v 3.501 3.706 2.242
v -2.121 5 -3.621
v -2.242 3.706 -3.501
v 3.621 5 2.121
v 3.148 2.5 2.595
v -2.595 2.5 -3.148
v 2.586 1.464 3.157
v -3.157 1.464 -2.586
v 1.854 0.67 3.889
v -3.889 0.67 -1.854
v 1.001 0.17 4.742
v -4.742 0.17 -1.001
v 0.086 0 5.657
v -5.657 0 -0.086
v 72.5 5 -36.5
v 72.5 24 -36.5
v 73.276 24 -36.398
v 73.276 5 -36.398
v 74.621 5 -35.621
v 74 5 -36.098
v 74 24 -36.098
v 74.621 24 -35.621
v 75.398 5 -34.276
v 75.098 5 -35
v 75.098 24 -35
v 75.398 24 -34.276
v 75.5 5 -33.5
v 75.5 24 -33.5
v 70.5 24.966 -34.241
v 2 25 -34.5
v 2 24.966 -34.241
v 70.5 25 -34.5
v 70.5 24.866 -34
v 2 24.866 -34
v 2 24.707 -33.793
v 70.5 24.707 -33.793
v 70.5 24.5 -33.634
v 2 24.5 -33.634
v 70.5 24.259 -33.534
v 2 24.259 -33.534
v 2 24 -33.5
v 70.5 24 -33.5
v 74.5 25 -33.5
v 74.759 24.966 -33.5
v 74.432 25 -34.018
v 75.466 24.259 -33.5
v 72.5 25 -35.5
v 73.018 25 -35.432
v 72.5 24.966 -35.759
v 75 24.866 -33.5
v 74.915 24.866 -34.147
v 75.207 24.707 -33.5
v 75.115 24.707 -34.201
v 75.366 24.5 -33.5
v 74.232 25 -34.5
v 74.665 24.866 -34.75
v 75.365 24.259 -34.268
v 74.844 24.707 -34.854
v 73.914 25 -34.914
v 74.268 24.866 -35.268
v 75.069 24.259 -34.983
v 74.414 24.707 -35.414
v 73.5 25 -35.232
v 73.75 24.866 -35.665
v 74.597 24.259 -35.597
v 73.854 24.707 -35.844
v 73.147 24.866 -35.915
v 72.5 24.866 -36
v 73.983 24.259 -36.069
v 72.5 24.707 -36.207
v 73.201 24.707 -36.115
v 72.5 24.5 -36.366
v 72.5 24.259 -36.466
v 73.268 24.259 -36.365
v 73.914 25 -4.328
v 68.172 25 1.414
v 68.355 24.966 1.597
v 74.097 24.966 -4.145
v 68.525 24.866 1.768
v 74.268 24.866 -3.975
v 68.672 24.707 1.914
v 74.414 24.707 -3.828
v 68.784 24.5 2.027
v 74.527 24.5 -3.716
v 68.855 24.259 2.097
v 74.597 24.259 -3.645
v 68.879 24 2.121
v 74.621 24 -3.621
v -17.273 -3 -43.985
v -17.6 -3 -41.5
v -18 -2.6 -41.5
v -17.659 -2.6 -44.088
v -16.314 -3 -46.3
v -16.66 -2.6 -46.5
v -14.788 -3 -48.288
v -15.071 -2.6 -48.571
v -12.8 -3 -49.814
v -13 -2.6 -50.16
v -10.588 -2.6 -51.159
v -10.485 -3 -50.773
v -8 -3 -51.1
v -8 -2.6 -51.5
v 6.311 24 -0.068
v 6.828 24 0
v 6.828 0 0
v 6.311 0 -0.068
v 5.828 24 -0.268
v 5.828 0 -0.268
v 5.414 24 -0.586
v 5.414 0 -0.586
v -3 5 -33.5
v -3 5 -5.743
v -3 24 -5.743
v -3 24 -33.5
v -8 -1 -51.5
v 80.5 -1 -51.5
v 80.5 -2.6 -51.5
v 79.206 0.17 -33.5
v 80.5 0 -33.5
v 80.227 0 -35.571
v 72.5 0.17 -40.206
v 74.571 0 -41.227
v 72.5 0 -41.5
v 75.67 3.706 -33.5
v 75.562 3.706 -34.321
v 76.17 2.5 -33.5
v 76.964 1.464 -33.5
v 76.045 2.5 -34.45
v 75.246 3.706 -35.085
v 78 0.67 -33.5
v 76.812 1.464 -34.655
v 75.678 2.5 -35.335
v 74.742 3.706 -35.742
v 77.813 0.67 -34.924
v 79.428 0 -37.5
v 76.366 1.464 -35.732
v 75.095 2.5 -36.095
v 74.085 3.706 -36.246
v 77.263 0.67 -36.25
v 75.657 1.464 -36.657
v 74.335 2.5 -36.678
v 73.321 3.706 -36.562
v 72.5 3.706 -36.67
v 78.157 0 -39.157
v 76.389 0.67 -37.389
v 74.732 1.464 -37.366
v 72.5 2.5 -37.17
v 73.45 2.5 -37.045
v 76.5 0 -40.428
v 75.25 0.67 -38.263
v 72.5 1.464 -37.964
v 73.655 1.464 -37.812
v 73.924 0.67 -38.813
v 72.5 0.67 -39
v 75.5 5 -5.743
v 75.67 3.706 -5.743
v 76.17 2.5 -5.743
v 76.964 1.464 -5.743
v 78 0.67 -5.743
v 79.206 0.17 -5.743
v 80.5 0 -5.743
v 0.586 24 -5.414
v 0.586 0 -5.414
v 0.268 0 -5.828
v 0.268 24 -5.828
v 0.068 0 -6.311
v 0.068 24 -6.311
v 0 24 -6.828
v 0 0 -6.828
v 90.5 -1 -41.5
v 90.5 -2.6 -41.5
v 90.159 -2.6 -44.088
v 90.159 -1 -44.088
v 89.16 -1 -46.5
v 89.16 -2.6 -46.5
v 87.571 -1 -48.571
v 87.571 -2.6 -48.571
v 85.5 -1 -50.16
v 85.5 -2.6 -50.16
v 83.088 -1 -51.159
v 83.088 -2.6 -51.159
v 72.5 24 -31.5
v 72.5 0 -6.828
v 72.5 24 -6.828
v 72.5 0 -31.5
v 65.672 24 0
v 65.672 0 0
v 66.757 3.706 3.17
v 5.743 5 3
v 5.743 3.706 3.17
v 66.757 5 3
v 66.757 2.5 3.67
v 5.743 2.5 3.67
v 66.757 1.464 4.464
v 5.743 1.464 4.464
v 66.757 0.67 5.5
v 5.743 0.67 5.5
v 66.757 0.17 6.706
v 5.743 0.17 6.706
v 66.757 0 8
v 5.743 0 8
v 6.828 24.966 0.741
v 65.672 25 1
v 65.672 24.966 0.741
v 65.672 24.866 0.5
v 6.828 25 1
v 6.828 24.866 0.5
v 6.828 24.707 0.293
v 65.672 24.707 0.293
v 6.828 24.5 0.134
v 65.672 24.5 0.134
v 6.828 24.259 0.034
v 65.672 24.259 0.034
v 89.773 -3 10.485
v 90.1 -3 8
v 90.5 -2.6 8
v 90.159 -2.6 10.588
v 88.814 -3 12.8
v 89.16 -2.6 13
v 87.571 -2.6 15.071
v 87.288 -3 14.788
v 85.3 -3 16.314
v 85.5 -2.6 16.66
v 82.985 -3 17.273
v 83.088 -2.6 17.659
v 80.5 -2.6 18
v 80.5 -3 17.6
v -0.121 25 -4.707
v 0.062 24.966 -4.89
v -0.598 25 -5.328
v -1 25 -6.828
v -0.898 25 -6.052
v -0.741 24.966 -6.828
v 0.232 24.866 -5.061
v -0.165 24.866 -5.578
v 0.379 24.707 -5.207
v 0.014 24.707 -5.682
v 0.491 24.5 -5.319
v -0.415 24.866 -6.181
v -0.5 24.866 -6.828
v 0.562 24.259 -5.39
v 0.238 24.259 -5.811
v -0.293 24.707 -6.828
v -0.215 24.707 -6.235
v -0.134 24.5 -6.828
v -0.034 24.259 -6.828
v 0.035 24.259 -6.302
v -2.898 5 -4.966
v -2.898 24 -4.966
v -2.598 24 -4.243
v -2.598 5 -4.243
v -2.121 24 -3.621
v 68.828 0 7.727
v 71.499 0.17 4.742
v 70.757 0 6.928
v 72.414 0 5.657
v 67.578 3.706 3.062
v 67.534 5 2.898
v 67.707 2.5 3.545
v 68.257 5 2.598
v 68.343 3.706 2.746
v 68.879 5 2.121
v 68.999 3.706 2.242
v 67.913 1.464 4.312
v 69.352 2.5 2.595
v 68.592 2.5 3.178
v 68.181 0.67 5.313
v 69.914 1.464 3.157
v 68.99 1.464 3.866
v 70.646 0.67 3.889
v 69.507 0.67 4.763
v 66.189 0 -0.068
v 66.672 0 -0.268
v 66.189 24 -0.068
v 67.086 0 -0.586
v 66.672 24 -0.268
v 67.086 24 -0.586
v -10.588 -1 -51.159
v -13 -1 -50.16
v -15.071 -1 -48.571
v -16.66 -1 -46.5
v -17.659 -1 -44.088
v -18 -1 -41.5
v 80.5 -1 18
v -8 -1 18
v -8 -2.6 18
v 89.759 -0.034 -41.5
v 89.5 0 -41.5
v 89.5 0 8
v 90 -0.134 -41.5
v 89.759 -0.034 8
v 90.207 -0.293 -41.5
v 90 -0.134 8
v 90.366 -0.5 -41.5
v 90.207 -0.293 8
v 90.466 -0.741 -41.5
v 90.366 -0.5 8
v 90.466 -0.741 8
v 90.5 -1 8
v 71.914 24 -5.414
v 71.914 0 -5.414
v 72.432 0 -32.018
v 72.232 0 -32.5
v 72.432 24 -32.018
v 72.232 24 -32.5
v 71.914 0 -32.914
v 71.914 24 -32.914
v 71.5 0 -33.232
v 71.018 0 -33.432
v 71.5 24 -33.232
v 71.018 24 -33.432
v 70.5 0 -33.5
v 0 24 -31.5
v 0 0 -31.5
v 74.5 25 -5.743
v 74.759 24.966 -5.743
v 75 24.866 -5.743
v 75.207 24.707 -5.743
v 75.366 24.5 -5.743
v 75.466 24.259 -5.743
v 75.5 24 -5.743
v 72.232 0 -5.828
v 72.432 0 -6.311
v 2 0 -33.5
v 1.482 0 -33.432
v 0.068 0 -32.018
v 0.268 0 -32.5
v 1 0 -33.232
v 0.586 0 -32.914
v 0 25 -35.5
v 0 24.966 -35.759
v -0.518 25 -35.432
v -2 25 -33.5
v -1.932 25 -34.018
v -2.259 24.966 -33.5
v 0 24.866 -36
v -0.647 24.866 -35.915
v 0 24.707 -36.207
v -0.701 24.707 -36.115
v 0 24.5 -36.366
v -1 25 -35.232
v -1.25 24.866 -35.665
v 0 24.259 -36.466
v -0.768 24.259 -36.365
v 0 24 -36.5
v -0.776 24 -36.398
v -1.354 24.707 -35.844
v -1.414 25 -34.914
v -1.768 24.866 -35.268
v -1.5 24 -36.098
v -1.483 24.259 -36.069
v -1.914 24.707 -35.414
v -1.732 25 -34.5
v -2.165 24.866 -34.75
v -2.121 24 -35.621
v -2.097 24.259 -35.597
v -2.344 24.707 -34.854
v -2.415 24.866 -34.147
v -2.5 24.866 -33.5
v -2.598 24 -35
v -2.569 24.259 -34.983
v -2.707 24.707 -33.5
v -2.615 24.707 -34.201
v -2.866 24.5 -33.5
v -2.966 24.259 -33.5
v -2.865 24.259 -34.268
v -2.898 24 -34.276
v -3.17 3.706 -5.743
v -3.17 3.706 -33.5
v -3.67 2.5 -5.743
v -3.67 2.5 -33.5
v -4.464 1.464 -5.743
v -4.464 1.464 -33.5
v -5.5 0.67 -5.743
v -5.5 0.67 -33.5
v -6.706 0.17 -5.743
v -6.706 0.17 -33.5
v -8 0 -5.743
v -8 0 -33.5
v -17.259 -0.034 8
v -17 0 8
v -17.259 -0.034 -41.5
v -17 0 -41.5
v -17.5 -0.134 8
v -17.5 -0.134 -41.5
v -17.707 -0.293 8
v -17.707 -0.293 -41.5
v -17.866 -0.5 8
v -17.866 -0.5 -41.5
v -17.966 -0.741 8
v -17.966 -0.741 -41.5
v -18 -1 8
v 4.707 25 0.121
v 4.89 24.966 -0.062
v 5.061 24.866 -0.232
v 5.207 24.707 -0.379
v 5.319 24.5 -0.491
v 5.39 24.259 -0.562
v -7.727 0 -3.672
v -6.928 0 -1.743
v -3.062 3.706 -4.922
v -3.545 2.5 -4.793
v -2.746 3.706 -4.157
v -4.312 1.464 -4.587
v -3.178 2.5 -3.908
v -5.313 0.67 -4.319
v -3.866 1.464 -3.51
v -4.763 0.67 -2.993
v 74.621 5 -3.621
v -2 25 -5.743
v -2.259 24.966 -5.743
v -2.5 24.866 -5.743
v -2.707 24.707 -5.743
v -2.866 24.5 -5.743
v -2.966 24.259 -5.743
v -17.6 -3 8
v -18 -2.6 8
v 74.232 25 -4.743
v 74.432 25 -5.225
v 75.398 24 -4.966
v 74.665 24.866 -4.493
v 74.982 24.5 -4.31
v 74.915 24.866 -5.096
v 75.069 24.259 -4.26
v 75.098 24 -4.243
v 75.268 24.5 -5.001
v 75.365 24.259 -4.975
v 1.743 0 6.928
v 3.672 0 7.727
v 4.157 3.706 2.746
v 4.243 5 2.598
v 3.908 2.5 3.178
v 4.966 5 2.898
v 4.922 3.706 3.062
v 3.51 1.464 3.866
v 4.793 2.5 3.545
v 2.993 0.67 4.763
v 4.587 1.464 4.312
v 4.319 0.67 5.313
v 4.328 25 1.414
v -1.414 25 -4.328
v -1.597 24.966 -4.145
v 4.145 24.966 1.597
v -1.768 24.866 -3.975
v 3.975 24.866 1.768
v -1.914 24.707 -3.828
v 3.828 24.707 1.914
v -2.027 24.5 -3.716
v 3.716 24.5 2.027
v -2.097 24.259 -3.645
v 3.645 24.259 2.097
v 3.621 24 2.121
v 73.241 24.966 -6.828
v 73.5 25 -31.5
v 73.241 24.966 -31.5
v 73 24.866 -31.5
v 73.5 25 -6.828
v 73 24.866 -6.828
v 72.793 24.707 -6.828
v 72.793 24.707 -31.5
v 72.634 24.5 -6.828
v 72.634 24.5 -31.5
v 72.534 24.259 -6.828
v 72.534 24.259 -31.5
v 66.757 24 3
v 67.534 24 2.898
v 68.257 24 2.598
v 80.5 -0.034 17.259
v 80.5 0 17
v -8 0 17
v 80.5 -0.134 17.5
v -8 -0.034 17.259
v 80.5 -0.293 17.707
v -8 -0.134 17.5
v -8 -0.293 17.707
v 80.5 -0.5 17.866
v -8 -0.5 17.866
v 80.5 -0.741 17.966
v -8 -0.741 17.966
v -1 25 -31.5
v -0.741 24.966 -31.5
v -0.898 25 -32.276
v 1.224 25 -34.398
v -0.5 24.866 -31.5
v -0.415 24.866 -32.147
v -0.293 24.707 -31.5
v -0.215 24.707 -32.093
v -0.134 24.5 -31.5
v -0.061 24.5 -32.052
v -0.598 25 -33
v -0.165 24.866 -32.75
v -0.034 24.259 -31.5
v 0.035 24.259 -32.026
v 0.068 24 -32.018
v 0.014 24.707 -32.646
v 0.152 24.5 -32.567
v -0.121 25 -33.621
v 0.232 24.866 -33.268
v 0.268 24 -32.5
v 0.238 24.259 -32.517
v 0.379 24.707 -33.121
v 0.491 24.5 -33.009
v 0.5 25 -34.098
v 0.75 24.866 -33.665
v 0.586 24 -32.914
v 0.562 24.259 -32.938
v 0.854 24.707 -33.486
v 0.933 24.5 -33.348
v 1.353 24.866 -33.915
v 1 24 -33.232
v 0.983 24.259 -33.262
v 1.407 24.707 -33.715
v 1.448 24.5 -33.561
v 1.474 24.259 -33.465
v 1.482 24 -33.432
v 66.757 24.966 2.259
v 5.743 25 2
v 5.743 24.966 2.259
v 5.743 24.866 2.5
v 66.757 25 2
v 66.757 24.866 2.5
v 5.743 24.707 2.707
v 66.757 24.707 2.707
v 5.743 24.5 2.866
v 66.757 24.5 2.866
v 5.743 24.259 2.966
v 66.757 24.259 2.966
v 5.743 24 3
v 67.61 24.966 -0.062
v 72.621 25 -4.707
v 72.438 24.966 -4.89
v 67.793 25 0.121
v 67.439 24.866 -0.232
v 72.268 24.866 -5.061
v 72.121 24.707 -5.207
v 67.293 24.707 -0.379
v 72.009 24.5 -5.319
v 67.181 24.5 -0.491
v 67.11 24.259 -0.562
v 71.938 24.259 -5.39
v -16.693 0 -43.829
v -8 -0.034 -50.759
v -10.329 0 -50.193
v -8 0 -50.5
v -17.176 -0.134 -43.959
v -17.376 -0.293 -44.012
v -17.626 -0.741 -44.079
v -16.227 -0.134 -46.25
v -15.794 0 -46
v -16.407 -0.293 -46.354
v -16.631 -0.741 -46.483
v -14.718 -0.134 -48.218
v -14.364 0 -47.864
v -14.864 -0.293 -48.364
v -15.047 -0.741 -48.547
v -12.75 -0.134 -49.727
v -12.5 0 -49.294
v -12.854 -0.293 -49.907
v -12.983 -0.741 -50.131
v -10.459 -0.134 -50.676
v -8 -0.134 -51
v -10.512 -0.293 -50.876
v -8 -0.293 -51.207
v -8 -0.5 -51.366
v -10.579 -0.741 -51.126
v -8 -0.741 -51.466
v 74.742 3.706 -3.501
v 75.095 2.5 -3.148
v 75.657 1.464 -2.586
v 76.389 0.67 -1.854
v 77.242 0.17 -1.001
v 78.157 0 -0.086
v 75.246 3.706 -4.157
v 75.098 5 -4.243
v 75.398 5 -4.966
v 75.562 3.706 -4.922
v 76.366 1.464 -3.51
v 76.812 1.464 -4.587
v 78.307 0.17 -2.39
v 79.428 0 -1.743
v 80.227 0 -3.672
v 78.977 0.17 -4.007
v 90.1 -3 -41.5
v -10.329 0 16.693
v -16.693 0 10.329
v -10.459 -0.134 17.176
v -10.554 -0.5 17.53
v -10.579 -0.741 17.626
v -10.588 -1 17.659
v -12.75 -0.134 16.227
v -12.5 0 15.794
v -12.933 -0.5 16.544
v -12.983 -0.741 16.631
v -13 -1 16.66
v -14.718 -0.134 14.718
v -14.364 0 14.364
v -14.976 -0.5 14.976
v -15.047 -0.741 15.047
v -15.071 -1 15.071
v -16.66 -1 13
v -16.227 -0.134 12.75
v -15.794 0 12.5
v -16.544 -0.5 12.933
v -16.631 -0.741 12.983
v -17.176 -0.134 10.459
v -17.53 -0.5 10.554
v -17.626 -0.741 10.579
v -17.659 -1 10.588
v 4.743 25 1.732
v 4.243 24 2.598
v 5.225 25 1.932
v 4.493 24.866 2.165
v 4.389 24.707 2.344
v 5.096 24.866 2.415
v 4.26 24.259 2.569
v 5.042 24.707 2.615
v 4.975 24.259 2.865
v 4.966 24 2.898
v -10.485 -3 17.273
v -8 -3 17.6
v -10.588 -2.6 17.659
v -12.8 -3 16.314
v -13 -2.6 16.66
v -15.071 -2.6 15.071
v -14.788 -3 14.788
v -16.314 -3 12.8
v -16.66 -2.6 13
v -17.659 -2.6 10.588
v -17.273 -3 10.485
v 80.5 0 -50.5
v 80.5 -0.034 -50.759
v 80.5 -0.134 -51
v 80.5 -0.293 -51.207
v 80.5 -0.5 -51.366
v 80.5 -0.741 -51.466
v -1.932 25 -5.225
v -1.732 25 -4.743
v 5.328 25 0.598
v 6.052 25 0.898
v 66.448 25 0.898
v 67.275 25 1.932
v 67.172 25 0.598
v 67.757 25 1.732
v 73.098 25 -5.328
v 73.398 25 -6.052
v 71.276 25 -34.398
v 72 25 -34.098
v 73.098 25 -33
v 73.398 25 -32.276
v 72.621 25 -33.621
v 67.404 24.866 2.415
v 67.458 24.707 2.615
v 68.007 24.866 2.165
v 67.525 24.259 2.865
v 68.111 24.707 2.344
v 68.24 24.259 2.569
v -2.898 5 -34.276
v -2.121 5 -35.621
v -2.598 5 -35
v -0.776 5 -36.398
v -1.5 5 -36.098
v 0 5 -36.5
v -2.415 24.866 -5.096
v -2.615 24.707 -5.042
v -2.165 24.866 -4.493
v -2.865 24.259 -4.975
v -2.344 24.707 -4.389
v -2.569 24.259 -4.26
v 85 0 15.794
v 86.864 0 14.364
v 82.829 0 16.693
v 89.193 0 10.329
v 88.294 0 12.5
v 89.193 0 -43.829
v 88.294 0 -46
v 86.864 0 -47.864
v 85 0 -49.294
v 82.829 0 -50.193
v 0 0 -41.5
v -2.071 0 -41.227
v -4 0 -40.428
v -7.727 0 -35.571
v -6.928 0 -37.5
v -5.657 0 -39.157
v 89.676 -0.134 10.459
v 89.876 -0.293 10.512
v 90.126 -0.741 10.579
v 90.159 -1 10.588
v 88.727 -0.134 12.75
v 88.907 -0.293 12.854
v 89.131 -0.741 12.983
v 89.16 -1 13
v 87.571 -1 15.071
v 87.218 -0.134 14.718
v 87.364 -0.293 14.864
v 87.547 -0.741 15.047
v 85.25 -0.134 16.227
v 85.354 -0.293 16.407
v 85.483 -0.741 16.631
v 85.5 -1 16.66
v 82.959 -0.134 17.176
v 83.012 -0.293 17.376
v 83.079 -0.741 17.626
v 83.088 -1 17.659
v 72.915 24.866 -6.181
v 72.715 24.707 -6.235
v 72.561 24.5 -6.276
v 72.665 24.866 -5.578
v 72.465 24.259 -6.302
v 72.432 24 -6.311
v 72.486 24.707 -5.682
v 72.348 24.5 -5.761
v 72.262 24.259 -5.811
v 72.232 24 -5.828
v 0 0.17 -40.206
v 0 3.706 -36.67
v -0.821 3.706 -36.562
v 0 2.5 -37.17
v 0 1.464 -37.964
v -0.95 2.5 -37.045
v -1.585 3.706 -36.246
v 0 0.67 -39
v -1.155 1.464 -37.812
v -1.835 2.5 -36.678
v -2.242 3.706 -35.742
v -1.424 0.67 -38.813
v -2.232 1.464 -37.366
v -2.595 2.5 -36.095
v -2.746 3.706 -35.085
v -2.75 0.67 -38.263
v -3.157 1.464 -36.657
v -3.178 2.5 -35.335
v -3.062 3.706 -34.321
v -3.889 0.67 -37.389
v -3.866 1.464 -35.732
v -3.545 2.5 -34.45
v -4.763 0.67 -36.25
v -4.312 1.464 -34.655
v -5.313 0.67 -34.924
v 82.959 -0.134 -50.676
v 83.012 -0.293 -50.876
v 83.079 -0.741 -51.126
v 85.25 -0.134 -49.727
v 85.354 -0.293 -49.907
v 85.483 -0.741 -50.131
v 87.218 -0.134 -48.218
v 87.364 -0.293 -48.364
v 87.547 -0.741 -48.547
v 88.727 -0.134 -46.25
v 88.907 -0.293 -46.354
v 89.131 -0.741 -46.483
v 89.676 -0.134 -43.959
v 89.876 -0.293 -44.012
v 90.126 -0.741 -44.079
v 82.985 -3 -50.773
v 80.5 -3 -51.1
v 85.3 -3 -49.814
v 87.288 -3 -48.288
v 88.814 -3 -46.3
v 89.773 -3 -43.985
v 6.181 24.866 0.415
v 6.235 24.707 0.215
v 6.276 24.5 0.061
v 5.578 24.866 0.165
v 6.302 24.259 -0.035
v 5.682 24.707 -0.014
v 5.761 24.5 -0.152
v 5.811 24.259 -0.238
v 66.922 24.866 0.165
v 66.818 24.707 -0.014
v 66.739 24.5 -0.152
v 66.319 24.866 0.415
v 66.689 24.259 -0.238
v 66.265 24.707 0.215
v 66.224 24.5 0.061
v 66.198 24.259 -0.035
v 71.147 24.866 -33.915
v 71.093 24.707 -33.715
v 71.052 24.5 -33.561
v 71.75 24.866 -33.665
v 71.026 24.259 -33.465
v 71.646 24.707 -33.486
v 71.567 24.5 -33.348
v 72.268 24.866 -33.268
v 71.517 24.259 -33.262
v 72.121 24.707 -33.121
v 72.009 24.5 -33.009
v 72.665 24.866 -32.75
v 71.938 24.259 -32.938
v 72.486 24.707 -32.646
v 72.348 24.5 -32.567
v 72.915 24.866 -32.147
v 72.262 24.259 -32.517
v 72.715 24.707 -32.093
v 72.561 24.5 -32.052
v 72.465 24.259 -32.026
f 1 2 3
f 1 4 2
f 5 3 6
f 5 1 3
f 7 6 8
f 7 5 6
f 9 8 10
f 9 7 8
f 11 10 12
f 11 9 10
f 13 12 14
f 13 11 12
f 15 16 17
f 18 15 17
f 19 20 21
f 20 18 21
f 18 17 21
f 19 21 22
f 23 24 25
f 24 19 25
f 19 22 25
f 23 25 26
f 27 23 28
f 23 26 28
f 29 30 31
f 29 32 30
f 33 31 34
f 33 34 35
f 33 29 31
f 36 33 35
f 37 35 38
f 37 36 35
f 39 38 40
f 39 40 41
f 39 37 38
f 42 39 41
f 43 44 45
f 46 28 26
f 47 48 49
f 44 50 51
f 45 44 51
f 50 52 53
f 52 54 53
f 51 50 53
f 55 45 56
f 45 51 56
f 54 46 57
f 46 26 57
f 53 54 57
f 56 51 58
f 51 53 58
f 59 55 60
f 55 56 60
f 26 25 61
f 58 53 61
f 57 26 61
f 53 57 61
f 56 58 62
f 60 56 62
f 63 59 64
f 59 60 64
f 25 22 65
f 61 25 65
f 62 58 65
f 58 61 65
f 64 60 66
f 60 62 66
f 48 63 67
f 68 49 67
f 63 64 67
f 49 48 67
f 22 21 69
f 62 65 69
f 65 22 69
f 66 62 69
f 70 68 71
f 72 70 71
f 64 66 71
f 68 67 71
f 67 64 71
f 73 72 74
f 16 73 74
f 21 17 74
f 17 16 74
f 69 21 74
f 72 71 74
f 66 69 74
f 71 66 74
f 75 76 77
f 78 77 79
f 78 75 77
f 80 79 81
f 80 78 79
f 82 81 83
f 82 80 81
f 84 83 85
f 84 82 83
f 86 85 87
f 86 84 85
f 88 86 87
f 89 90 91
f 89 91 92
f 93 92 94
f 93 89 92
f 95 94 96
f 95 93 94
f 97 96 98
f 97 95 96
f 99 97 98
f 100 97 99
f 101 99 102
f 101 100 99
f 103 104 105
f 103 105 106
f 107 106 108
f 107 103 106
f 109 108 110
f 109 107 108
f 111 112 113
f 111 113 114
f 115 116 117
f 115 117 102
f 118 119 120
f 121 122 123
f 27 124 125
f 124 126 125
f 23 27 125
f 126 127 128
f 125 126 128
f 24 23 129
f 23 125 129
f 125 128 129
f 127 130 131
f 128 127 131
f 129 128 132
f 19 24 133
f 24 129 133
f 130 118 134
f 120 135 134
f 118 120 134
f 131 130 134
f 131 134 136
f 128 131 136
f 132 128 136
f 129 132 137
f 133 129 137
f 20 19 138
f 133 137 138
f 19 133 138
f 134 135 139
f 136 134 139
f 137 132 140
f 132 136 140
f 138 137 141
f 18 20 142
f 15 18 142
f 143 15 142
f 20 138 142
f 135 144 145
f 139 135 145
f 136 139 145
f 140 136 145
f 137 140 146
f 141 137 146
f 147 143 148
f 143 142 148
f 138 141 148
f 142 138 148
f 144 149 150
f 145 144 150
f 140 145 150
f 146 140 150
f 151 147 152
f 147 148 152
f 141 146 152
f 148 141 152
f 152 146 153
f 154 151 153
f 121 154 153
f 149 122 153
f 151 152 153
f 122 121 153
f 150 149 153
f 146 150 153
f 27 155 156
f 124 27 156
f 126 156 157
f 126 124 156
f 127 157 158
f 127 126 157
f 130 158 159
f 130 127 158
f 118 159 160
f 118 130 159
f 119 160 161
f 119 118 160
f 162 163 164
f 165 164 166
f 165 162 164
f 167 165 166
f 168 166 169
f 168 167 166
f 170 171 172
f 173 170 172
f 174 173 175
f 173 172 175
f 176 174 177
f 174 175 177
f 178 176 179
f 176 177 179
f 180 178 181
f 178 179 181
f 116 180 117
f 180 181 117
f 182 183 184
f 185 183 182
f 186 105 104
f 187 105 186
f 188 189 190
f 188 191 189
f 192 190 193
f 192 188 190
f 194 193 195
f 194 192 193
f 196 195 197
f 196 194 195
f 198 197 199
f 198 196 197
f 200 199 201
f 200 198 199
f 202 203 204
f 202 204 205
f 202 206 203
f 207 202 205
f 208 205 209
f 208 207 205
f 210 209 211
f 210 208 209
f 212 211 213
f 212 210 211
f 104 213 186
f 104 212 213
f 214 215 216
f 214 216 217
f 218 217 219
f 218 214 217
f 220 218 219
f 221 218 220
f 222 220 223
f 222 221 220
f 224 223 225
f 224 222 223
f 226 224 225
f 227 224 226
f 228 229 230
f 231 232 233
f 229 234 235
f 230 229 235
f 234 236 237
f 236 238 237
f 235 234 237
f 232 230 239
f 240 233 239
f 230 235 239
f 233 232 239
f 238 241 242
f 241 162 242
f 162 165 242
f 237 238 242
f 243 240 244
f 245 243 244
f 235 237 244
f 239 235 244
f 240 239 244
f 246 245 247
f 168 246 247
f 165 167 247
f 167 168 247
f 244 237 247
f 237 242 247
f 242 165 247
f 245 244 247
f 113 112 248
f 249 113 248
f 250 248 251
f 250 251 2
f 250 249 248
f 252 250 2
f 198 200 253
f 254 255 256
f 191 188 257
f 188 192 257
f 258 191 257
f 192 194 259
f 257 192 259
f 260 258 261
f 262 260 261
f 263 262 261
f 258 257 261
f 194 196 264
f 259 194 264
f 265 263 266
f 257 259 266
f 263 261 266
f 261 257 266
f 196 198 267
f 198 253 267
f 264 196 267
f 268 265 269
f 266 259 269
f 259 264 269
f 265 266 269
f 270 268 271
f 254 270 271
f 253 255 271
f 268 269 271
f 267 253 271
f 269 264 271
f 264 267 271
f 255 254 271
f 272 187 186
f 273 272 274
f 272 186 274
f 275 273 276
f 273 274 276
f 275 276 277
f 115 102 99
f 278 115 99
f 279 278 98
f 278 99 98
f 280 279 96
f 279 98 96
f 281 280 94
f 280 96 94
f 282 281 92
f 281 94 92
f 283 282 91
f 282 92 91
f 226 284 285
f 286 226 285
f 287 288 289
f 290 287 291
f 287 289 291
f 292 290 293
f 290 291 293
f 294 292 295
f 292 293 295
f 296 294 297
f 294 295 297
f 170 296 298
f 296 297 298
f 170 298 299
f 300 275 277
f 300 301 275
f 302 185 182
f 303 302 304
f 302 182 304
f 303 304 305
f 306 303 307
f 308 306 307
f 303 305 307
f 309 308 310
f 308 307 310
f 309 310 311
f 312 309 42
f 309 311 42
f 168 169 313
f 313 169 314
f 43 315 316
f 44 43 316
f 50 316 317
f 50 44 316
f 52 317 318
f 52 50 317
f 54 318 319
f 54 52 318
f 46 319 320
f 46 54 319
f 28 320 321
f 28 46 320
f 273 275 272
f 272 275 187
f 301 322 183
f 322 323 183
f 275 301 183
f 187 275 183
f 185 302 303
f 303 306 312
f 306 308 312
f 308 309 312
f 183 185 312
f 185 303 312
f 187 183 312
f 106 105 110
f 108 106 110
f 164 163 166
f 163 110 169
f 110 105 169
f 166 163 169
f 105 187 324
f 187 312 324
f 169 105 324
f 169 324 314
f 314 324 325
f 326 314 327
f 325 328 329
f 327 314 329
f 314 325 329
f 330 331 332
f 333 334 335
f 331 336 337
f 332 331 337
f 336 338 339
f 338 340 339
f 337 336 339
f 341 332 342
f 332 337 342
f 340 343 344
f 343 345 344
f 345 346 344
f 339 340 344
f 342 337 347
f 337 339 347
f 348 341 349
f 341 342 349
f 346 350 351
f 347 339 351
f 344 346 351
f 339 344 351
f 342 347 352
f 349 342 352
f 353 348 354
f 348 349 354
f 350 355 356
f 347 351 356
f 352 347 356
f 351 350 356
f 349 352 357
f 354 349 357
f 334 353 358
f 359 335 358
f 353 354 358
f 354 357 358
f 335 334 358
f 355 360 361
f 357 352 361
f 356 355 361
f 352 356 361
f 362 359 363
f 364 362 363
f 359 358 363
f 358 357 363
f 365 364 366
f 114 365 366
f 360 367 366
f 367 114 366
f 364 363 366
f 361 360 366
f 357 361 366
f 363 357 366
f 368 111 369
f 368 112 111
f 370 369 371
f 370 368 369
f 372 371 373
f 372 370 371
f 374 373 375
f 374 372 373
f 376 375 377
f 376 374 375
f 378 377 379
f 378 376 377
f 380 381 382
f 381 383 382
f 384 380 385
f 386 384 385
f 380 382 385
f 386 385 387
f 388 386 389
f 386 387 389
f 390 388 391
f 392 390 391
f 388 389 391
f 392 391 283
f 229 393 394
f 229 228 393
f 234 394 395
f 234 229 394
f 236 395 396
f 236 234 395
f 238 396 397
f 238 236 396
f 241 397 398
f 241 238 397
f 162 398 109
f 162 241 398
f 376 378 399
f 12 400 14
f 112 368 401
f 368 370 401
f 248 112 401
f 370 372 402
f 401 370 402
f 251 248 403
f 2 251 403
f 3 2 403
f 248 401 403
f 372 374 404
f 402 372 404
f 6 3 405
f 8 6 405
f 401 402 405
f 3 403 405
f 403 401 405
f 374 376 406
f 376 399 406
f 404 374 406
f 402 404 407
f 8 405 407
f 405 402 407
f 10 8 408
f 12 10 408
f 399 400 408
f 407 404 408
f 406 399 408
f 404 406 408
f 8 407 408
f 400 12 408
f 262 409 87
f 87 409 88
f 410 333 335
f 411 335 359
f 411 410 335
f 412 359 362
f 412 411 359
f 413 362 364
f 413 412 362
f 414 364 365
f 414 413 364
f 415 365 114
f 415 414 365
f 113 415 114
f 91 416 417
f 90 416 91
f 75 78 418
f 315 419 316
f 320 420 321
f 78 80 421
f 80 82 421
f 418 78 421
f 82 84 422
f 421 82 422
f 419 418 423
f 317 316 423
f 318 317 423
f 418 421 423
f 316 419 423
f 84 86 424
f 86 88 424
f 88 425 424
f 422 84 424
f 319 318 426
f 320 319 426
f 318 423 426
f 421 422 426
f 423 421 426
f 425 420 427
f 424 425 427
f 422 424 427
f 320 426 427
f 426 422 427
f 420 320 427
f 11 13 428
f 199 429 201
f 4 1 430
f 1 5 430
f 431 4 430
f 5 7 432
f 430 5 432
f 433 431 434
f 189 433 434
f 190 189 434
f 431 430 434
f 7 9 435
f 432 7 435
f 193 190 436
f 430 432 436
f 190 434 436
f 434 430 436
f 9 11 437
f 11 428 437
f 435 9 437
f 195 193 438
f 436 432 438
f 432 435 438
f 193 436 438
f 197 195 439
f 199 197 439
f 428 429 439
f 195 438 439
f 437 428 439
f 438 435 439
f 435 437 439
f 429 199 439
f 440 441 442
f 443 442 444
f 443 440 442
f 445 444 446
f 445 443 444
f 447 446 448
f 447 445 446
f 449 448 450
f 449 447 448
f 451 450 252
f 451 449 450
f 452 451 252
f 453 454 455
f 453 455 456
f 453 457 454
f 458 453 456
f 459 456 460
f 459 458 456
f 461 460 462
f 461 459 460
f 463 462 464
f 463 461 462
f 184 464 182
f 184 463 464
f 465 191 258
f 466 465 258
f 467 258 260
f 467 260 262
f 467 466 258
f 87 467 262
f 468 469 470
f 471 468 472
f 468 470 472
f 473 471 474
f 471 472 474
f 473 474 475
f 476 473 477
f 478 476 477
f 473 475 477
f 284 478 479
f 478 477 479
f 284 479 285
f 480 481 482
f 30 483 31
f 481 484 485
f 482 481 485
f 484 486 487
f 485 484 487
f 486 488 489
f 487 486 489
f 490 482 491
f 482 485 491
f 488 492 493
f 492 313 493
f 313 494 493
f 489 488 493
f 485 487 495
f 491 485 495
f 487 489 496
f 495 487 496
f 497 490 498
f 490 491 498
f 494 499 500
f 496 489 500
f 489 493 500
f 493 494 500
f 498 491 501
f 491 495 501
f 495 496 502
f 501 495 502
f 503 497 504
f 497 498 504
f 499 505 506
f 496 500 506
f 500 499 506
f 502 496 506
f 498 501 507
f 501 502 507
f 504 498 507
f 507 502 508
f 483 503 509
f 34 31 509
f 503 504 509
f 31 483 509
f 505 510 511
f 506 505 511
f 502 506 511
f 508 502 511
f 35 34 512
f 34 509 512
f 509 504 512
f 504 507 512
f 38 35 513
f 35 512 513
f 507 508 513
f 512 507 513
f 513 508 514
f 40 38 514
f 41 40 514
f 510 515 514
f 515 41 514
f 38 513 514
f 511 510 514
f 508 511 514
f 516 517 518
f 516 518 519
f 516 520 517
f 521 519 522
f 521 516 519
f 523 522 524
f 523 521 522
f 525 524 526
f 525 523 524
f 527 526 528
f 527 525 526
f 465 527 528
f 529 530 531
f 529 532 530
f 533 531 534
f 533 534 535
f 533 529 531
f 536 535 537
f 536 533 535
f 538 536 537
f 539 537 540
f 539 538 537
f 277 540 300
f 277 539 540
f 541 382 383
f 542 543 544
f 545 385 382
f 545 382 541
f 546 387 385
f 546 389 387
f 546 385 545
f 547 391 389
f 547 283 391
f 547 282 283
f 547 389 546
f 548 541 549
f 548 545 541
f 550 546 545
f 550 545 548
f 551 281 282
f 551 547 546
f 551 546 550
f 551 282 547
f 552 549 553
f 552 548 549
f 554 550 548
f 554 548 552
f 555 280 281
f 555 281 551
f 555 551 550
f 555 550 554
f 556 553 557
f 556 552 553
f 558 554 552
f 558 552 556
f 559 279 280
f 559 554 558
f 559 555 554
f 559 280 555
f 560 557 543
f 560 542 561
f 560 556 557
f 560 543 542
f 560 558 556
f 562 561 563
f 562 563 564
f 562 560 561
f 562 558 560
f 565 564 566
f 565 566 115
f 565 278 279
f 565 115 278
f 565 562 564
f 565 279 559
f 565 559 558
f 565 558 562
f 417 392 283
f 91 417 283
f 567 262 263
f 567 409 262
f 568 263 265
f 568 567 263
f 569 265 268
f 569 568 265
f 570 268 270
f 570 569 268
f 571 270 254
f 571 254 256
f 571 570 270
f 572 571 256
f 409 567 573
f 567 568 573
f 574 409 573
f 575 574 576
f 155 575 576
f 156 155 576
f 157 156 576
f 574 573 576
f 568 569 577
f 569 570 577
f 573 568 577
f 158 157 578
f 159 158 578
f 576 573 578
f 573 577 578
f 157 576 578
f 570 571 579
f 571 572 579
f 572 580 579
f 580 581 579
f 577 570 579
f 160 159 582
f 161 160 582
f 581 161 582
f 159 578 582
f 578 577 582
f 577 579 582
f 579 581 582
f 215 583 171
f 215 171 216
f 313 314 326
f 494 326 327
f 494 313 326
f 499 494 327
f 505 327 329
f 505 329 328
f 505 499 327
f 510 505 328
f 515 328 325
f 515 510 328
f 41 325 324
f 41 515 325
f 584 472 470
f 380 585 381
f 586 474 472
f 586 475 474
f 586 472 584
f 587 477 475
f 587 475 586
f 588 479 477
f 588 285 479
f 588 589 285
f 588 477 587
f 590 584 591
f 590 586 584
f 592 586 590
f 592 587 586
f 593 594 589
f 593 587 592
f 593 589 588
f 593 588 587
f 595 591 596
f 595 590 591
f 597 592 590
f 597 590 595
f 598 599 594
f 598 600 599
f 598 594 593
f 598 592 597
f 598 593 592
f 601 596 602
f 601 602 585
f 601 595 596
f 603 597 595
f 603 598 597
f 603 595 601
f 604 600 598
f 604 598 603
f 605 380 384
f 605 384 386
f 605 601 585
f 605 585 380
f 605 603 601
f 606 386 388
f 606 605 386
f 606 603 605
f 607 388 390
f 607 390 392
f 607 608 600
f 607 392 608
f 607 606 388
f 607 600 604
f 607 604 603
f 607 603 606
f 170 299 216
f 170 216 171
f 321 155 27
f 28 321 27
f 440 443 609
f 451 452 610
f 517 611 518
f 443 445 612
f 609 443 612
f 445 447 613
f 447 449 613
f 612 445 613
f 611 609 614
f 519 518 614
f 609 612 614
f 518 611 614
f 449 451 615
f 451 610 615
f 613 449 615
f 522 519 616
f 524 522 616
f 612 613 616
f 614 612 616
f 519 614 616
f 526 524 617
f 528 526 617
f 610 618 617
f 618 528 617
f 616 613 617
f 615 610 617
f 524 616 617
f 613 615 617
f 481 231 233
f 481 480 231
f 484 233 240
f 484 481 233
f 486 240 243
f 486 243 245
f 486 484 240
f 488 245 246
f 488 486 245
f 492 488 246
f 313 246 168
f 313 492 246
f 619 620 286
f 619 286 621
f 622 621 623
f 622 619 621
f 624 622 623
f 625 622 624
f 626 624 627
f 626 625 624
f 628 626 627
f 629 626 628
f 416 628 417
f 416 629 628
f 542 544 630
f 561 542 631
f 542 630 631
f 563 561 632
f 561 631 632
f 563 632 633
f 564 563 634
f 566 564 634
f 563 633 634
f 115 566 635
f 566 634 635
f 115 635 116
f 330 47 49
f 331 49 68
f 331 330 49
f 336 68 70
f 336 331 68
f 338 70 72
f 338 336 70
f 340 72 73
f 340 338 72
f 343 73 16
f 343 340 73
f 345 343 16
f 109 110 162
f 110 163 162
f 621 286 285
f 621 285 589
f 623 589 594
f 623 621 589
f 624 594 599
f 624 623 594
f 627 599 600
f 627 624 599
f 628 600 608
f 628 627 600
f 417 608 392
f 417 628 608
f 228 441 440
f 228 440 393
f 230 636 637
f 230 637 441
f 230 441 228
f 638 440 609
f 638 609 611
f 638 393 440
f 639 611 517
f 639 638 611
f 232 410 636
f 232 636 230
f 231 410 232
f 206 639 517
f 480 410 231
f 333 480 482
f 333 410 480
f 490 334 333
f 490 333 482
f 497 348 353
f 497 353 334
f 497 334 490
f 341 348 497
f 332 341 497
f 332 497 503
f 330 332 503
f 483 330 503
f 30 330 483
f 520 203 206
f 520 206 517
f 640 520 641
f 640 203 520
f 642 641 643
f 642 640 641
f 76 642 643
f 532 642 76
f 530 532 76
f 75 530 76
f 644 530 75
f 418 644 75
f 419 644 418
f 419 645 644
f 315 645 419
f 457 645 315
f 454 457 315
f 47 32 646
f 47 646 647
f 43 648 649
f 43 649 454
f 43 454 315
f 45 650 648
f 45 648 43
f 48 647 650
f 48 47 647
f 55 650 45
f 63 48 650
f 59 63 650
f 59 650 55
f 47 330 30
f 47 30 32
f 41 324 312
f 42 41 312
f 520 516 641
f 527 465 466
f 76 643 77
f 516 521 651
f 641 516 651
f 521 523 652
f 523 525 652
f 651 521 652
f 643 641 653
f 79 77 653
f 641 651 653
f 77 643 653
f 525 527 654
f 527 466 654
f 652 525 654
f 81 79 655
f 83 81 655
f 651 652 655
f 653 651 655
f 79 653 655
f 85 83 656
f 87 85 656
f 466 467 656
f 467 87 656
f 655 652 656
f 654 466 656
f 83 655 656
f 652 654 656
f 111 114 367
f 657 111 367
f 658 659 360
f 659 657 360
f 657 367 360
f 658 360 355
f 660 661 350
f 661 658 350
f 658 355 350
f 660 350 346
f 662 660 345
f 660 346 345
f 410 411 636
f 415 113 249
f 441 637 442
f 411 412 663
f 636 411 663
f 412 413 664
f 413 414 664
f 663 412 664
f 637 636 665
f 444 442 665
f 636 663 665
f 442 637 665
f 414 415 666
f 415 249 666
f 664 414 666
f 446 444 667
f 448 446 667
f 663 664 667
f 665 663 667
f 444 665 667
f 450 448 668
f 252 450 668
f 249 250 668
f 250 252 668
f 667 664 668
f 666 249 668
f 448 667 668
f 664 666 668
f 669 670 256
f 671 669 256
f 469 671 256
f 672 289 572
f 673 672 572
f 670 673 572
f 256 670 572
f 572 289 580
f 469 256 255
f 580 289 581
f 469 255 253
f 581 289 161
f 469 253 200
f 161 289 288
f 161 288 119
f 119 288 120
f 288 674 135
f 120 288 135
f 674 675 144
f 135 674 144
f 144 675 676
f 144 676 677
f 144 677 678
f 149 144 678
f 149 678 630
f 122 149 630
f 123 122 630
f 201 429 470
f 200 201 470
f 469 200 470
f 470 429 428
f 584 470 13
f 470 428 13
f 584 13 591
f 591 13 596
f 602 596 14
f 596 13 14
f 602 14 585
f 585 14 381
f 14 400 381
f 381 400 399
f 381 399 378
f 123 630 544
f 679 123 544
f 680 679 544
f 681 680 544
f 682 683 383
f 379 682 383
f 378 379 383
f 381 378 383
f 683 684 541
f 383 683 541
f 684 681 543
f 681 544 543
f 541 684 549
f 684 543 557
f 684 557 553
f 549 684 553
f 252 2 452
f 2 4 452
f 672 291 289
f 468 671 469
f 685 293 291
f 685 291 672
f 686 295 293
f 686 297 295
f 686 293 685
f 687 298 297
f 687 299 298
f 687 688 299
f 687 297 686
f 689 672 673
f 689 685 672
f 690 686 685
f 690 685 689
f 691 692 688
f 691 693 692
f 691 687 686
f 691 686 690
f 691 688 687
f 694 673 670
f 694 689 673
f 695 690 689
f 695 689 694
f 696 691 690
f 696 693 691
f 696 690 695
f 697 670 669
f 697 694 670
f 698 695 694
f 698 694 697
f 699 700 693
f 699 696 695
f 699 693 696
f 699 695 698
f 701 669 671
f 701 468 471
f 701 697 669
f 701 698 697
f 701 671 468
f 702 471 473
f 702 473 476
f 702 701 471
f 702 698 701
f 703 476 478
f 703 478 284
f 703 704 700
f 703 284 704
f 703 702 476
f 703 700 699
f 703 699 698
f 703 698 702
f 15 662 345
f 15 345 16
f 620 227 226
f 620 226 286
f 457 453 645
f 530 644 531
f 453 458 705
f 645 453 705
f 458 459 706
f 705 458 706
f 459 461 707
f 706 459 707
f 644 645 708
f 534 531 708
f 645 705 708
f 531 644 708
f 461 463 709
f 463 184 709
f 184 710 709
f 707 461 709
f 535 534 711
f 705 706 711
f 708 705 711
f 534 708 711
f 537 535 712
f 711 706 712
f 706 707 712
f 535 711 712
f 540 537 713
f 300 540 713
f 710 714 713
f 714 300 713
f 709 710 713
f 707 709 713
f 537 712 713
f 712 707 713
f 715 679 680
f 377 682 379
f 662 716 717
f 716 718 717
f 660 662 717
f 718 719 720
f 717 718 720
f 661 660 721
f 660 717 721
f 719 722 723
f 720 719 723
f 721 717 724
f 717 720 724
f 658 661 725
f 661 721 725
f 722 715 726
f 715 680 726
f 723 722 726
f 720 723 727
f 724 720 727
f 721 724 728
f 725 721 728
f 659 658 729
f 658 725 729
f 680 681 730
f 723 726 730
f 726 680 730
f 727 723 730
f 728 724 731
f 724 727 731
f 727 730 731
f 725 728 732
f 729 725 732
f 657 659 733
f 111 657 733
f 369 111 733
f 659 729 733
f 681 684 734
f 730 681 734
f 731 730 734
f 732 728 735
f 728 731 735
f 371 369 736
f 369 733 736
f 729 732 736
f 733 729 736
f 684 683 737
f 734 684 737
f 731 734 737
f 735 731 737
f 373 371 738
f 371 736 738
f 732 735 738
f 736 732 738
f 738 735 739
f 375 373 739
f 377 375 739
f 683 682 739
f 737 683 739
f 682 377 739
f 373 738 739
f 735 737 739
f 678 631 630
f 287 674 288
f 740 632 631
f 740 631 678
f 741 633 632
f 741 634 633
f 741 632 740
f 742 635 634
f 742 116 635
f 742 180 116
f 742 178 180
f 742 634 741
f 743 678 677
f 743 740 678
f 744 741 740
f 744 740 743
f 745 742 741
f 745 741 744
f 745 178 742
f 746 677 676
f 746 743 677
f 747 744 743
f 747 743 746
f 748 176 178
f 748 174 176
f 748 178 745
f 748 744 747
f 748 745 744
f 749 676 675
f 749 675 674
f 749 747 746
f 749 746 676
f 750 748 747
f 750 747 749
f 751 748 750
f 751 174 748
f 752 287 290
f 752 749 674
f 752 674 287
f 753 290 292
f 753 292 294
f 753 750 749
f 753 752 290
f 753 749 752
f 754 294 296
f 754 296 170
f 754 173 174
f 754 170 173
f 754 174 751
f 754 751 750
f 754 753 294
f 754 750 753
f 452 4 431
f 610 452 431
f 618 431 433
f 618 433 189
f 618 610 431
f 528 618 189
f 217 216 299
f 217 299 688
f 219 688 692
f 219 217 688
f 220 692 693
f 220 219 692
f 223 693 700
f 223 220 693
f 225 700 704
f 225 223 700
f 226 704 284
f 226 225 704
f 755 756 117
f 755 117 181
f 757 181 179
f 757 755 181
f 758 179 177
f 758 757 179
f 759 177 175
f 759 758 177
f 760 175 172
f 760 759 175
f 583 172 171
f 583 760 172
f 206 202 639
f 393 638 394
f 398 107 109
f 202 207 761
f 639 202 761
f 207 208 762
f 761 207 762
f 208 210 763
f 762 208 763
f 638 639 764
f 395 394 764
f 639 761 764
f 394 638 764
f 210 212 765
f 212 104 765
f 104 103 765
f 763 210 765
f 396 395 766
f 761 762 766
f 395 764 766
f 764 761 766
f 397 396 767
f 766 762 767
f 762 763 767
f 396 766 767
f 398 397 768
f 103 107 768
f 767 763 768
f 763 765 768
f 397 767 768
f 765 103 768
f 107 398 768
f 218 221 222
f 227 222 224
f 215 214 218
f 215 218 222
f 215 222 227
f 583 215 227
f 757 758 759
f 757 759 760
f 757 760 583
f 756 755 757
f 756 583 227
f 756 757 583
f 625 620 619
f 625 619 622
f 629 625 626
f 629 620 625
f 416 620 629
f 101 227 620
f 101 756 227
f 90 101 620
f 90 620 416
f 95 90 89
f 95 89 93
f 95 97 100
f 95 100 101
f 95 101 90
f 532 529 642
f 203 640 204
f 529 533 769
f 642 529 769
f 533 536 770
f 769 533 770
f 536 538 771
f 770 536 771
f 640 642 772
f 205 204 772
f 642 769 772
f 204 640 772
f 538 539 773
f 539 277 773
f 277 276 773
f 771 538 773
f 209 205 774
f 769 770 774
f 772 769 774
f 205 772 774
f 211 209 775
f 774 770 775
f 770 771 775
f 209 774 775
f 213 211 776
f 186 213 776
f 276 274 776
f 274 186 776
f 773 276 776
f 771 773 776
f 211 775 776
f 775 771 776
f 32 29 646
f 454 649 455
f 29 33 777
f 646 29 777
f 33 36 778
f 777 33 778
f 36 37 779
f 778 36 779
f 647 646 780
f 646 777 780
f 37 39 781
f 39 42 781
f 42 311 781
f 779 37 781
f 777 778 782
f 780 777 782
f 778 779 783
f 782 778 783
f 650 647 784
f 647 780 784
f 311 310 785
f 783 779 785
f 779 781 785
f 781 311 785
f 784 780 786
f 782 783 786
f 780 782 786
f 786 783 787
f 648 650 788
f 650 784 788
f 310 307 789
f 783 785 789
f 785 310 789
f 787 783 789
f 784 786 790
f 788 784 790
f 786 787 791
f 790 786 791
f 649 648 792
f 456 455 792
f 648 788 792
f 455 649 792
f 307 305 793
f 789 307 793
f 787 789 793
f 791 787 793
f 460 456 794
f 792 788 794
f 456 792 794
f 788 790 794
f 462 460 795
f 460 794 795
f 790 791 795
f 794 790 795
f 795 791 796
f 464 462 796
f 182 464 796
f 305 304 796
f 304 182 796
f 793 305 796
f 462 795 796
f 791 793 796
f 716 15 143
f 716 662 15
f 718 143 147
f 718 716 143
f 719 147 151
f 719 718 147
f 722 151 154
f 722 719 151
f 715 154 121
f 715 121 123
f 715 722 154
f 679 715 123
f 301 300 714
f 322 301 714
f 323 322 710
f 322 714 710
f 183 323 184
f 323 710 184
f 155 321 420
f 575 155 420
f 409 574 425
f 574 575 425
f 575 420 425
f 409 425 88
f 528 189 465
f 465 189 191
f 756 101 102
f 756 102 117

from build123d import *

# Parameters (mm, degrees)
SKETCH_1_W      = 78.5
SKETCH_1_H      = 39.5
SKETCH_1_W_2    = 72.5
SKETCH_1_H_2    = 33.5
EXTRUDE_1_DEPTH = 25
SKETCH_2_W      = 108.5
SKETCH_2_H      = 69.5
EXTRUDE_2_DEPTH = 3
FILLET_1_R      = 10
CHAMFER_1_SIZE  = 6
CHAMFER_2_SIZE  = 7.5
FILLET_2_R      = 2
FILLET_3_R      = 3
FILLET_4_R      = 5
FILLET_5_R      = 1
FILLET_6_R      = 1
CHAMFER_3_SIZE  = 0.4


with BuildPart() as part:
    # 草图1 → 凸台-拉伸1 (new body)
    with BuildSketch(Plane(origin=(0, 0, 0), x_dir=(1, 0, 0), z_dir=(0, 1, 0))):
        with Locations((36.25, 16.75)):
            Rectangle(SKETCH_1_W, SKETCH_1_H)
        with Locations((36.25, 16.75)):
            Rectangle(SKETCH_1_W_2, SKETCH_1_H_2, mode=Mode.SUBTRACT)
    extrude(amount=EXTRUDE_1_DEPTH)

    # 草图2 → 凸台-拉伸2 (add)
    with BuildSketch(Plane(origin=(0, 0, 0), x_dir=(-1, 0, 0), z_dir=(0, -1, 0))):
        with Locations((-36.25, 16.75)):
            Rectangle(SKETCH_2_W, SKETCH_2_H)
    extrude(amount=EXTRUDE_2_DEPTH)

    # 圆角1
    fillet_1_edges = [part.edges().sort_by_distance(p)[0] for p in [
        (-18, -1.5, -51.5),
        (90.5, -1.5, -51.5),
        (90.5, -1.5, 18),
        (-18, -1.5, 18),
    ]]
    fillet(fillet_1_edges, radius=FILLET_1_R)

    # 倒角1
    chamfer_1_edges = [part.edges().sort_by_distance(p)[0] for p in [
        (0, 12.5, 0),
        (72.5, 12.5, 0),
    ]]
    chamfer(chamfer_1_edges, length=CHAMFER_1_SIZE)

    # 倒角2
    chamfer_2_edges = [part.edges().sort_by_distance(p)[0] for p in [
        (75.5, 12.5, 3),
        (-3, 12.5, 3),
    ]]
    chamfer(chamfer_2_edges, length=CHAMFER_2_SIZE)

    # 圆角2
    fillet_2_edges = [part.edges().sort_by_distance(p)[0] for p in [
        (0, 12.5, -33.5),
        (72.5, 12.5, -33.5),
        (6, 12.5, 0),
        (66.5, 12.5, 0),
        (72.5, 12.5, -6),
        (0, 12.5, -6),
    ]]
    fillet(fillet_2_edges, radius=FILLET_2_R)

    # 圆角3
    fillet_3_edges = [part.edges().sort_by_distance(p)[0] for p in [
        (-3, 12.5, -36.5),
        (75.5, 12.5, -36.5),
        (68, 12.5, 3),
        (4.5, 12.5, 3),
        (-3, 12.5, -4.5),
        (75.5, 12.5, -4.5),
    ]]
    fillet(fillet_3_edges, radius=FILLET_3_R)

    # 圆角4
    fillet_4_edges = [part.edges().sort_by_distance(p)[0] for p in [
        (75.5, 0, -19.621320344),
        (71.75, 0, -0.75),
        (36.25, 0, 3),
        (0.75, 0, -0.75),
        (-3, 0, -19.621320344),
        (36.25, 0, -36.5),
        (75.271638598, 0, -4.59459039),
        (67.90540961, 0, 2.771638598),
        (4.59459039, 0, 2.771638598),
        (-2.771638598, 0, -4.59459039),
        (-2.121320344, 0, -35.621320344),
        (74.621320344, 0, -35.621320344),
    ]]
    fillet(fillet_4_edges, radius=FILLET_4_R)

    # 圆角5
    fillet_5_edges = [part.edges().sort_by_distance(p)[0] for p in [
        (0, 25, -19.164213562),
        (72.5, 25, -19.164213562),
        (69.5, 25, -3),
        (3, 25, -3),
        (36.25, 25, 0),
        (0.585786438, 25, -32.914213562),
        (71.914213562, 25, -32.914213562),
        (72.347759065, 25, -6.06306026),
        (0.152240935, 25, -6.06306026),
        (6.06306026, 25, -0.152240935),
        (66.43693974, 25, -0.152240935),
        (75.5, 25, -19.621320344),
        (71.75, 25, -0.75),
        (-3, 25, -19.621320344),
        (0.75, 25, -0.75),
        (36.25, 25, 3),
        (36.25, 25, -36.5),
        (74.621320344, 25, -35.621320344),
        (-2.121320344, 25, -35.621320344),
        (-2.771638598, 25, -4.59459039),
        (4.59459039, 25, 2.771638598),
        (67.90540961, 25, 2.771638598),
        (75.271638598, 25, -4.59459039),
        (36.25, 25, -33.5),
    ]]
    fillet(fillet_5_edges, radius=FILLET_5_R)

    # 圆角6
    fillet_6_edges = [part.edges().sort_by_distance(p)[0] for p in [
        (-18, 0, -16.75),
        (36.25, 0, -51.5),
        (36.25, 0, 18),
        (90.5, 0, -16.75),
        (87.571067812, 0, 15.071067812),
        (87.571067812, 0, -48.571067812),
        (-15.071067812, 0, -48.571067812),
        (-15.071067812, 0, 15.071067812),
    ]]
    fillet(fillet_6_edges, radius=FILLET_6_R)

    # 倒角3
    chamfer_3_edges = [part.edges().sort_by_distance(p)[0] for p in [
        (-18, -3, -16.75),
        (36.25, -3, 18),
        (36.25, -3, -51.5),
        (90.5, -3, -16.75),
        (87.571067812, -3, 15.071067812),
        (87.571067812, -3, -48.571067812),
        (-15.071067812, -3, -48.571067812),
        (-15.071067812, -3, 15.071067812),
    ]]
    chamfer(chamfer_3_edges, length=CHAMFER_3_SIZE)


solid = part.part
